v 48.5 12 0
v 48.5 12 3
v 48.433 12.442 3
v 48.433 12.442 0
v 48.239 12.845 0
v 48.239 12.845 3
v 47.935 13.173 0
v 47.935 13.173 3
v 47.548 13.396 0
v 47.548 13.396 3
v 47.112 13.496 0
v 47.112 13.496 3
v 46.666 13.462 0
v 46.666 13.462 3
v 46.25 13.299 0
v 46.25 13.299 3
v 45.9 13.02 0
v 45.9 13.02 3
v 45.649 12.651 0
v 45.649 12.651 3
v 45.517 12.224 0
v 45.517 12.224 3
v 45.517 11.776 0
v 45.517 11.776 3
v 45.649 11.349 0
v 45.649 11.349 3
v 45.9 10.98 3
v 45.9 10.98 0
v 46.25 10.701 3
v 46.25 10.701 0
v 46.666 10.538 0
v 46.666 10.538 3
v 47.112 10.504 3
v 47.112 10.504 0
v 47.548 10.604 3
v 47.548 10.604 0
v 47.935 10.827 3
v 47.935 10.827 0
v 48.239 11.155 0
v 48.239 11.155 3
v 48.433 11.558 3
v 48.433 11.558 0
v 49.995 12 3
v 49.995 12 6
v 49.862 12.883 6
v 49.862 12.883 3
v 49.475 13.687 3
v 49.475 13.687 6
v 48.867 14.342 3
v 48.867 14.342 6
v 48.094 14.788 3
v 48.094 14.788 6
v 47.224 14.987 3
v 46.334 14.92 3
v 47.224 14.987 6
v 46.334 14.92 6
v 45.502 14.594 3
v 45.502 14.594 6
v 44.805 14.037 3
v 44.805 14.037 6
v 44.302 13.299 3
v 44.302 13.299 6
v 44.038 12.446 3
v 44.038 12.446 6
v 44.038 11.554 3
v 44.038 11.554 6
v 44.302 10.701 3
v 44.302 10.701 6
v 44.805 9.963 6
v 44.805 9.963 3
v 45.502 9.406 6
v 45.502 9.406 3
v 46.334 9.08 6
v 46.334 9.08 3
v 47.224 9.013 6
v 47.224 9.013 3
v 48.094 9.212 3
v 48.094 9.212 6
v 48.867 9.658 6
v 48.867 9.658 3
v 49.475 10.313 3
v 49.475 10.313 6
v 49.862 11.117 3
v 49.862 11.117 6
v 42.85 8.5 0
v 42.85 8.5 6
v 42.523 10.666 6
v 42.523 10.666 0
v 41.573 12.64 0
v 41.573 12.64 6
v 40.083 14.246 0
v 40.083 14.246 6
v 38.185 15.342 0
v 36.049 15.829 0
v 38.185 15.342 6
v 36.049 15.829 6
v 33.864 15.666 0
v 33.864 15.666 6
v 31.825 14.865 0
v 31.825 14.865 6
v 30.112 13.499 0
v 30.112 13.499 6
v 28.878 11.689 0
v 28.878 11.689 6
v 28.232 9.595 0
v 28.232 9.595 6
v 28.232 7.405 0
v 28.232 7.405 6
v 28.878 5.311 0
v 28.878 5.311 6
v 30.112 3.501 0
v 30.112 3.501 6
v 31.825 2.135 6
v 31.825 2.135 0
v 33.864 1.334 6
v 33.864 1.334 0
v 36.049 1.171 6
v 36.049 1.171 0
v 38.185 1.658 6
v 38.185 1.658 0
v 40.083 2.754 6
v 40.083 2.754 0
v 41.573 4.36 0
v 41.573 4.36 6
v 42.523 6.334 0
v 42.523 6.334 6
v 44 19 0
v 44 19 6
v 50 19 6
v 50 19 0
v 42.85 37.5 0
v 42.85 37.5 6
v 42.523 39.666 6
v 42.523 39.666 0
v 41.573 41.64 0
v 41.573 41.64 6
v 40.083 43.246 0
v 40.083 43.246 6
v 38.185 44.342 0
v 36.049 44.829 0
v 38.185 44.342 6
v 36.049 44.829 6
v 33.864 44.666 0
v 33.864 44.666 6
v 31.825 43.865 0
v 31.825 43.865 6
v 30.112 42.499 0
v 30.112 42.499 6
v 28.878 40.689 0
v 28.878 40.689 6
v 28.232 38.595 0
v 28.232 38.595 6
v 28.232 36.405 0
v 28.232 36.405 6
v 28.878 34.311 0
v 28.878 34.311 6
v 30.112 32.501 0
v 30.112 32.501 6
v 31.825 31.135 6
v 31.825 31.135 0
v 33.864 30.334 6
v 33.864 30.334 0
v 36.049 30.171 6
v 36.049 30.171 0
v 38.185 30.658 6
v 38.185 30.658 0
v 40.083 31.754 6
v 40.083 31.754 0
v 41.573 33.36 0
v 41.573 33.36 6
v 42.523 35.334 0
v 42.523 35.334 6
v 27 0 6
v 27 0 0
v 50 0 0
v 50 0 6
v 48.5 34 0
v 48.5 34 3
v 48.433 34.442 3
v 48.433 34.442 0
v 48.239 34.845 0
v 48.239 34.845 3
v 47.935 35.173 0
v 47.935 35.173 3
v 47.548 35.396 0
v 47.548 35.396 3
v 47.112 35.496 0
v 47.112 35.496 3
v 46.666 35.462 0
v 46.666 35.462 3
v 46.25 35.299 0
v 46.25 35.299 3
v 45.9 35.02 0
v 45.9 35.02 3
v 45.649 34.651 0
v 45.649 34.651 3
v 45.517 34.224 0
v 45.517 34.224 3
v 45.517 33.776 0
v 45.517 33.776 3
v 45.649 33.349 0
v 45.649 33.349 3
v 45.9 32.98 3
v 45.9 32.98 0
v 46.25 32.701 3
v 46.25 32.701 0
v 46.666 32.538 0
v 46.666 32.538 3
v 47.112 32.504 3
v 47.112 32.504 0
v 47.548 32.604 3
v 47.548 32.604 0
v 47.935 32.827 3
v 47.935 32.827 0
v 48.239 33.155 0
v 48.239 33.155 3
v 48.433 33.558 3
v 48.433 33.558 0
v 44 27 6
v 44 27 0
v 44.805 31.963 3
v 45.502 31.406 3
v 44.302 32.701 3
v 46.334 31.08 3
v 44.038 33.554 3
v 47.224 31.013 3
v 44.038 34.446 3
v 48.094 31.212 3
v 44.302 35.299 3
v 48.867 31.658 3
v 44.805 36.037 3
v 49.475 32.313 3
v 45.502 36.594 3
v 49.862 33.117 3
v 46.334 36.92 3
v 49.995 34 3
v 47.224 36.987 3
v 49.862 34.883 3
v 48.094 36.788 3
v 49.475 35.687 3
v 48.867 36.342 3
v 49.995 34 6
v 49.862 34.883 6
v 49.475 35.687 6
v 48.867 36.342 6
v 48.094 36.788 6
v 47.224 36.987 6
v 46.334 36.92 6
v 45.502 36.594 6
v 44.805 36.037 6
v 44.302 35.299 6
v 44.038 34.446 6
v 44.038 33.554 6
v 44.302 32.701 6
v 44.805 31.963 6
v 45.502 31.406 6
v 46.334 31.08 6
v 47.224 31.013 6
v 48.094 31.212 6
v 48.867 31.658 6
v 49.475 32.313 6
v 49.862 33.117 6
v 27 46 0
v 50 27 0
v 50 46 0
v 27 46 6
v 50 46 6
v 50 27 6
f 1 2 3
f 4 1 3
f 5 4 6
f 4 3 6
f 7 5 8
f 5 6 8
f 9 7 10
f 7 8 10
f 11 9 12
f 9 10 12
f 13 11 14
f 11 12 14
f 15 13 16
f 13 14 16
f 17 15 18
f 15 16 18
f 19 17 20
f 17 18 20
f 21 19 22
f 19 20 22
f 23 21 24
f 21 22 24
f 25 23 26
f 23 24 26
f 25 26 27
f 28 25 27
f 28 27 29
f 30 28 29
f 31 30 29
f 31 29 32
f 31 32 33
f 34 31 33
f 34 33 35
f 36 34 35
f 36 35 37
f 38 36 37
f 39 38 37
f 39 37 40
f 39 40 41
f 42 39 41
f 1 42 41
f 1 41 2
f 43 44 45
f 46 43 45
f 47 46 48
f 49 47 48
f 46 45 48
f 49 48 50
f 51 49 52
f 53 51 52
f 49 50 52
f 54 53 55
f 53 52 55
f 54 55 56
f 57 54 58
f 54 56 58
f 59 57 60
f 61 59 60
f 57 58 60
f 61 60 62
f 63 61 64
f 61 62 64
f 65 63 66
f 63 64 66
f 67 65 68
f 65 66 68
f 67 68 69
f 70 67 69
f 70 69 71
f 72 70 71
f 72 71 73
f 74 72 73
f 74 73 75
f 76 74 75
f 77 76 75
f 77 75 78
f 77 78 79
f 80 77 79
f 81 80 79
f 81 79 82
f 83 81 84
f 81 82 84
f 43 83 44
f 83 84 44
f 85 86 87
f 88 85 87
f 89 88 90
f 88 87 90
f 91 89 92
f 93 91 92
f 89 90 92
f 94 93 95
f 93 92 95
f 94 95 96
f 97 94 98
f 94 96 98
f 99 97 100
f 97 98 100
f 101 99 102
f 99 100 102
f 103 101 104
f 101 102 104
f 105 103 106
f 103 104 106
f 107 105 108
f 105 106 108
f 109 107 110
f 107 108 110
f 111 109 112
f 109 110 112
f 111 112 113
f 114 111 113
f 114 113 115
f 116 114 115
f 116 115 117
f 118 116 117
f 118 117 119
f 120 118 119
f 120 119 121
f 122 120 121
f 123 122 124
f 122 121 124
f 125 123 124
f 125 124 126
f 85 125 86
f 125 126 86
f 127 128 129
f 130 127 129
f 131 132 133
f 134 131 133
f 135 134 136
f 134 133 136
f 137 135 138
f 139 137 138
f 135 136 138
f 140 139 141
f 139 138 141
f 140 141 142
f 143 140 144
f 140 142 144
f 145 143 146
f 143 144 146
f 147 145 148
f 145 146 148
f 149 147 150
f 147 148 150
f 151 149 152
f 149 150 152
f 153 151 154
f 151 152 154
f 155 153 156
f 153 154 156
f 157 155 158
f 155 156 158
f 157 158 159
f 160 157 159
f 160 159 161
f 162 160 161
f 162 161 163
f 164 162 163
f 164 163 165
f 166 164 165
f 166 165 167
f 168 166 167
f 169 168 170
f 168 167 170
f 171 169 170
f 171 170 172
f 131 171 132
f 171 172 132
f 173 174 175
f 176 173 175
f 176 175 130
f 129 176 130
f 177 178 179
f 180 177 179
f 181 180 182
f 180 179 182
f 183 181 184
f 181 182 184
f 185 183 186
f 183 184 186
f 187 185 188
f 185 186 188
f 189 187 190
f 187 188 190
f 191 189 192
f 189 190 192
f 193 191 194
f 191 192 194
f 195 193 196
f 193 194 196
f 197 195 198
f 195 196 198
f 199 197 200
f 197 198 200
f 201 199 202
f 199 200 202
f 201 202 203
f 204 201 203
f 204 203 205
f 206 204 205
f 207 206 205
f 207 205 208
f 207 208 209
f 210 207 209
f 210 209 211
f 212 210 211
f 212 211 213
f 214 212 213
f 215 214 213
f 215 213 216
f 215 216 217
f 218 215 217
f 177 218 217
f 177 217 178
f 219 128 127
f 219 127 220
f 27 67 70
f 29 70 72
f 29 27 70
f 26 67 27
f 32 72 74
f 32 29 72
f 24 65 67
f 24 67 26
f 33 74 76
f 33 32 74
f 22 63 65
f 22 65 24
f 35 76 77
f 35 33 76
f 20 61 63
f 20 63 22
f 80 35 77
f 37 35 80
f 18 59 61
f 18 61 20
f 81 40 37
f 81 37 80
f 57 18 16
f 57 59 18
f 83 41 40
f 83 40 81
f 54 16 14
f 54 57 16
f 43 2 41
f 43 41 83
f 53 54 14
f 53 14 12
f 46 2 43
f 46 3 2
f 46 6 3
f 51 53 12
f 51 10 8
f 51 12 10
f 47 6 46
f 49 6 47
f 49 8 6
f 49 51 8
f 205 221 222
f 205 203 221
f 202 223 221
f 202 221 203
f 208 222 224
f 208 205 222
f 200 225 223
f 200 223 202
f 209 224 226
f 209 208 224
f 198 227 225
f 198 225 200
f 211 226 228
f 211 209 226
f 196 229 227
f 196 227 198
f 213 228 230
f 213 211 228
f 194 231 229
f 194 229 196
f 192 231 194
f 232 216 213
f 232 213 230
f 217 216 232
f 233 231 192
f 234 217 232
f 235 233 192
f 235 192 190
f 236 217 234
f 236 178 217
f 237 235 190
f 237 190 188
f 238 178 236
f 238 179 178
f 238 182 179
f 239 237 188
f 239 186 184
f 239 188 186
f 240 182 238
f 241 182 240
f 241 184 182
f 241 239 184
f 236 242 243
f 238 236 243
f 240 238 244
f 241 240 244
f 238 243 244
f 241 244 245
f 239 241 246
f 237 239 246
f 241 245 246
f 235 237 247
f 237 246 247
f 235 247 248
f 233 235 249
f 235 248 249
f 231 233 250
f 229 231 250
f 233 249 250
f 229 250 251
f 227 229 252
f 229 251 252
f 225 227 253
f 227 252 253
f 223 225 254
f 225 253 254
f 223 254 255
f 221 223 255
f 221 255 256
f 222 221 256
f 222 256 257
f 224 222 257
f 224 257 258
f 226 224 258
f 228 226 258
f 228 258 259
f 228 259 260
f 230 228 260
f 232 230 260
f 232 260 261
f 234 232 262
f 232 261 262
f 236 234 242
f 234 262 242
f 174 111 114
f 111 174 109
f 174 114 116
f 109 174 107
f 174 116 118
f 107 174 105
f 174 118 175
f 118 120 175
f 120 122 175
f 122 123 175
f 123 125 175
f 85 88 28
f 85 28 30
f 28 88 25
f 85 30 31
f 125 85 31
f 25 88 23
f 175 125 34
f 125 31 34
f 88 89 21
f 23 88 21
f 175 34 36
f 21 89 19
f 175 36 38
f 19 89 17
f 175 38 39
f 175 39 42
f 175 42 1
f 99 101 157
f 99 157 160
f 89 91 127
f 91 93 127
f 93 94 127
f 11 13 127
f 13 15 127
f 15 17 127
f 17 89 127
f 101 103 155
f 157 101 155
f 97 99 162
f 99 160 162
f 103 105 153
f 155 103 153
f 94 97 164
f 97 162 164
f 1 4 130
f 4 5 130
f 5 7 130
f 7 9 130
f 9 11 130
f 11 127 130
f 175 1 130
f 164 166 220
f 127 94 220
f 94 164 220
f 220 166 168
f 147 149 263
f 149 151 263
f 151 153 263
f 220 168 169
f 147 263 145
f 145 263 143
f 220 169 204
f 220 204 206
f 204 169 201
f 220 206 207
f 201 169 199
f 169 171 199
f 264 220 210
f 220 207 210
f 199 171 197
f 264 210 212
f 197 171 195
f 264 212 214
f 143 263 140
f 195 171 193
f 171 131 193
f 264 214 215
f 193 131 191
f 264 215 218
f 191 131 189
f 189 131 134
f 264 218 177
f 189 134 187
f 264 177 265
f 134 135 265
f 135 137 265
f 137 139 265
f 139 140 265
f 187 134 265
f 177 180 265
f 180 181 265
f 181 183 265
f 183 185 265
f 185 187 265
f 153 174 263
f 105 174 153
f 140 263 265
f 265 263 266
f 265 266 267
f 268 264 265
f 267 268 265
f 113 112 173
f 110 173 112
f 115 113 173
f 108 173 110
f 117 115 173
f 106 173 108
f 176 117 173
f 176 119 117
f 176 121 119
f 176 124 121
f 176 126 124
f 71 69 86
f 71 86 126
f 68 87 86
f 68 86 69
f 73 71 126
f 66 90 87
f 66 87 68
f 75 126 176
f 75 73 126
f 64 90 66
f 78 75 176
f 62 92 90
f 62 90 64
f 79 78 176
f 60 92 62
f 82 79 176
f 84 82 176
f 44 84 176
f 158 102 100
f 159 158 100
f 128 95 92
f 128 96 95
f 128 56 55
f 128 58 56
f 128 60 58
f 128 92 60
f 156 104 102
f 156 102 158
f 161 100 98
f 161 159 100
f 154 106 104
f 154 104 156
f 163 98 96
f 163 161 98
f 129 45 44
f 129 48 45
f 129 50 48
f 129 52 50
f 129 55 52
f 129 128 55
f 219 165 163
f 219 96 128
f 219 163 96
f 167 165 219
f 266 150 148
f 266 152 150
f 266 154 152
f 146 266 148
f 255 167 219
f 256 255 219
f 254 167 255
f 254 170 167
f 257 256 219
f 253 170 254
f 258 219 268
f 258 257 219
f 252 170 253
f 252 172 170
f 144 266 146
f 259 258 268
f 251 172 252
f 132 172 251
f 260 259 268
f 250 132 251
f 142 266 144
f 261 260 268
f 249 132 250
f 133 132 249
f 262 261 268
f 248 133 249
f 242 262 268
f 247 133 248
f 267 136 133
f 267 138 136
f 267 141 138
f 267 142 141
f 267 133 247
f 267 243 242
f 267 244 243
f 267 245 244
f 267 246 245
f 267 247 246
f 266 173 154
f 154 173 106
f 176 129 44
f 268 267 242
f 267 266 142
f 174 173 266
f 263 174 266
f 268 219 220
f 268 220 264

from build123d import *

# Parameters (mm, degrees)
ESQUISSE1_W             = 50
ESQUISSE1_H             = 46
BOSS_EXTRU_2_DEPTH      = 6
ESQUISSE2_W             = 27
ESQUISSE2_H             = 46
ENL_V_MAT_EXTRU_1_DEPTH = 6
ESQUISSE3_R             = 7.35
ENL_V_MAT_EXTRU_2_DEPTH = 6
ESQUISSE4_R             = 1.5
ENL_V_MAT_EXTRU_3_DEPTH = 6
ESQUISSE5_R             = 2.995
ENL_V_MAT_EXTRU_5_DEPTH = 3
ESQUISSE6_W             = 6
ESQUISSE6_H             = 8
ENL_V_MAT_EXTRU_6_DEPTH = 6


with BuildPart() as part:
    # Esquisse1 → Boss.-Extru.2 (new body)
    with BuildSketch(Plane.XY):
        with Locations((25, 23)):
            Rectangle(ESQUISSE1_W, ESQUISSE1_H)
    extrude(amount=BOSS_EXTRU_2_DEPTH)

    # Esquisse2 → Enlèv. mat.-Extru.1 (cut)
    with BuildSketch(Plane.XY.offset(6)):
        with Locations((13.5, 23)):
            Rectangle(ESQUISSE2_W, ESQUISSE2_H)
    extrude(amount=-ENL_V_MAT_EXTRU_1_DEPTH, mode=Mode.SUBTRACT)

    # Esquisse3 → Enlèv. mat.-Extru.2 (cut)
    with BuildSketch(Plane.XY.offset(6)):
        with Locations((35.5, 37.5)):
            Circle(ESQUISSE3_R)
        with Locations((35.5, 8.5)):
            Circle(ESQUISSE3_R)
    extrude(amount=-ENL_V_MAT_EXTRU_2_DEPTH, mode=Mode.SUBTRACT)

    # Esquisse4 → Enlèv. mat.-Extru.3 (cut)
    with BuildSketch(Plane.XY.offset(6)):
        with Locations((47, 34)):
            Circle(ESQUISSE4_R)
        with Locations((47, 12)):
            Circle(ESQUISSE4_R)
    extrude(amount=-ENL_V_MAT_EXTRU_3_DEPTH, mode=Mode.SUBTRACT)

    # Esquisse5 → Enlèv. mat.-Extru.5 (cut)
    with BuildSketch(Plane.XY.offset(6)):
        with Locations((47, 12)):
            Circle(ESQUISSE5_R)
        with Locations((47, 34)):
            Circle(ESQUISSE5_R)
    extrude(amount=-ENL_V_MAT_EXTRU_5_DEPTH, mode=Mode.SUBTRACT)

    # Esquisse6 → Enlèv. mat.-Extru.6 (cut)
    with BuildSketch(Plane.XY.offset(6)):
        with Locations((47, 23)):
            Rectangle(ESQUISSE6_W, ESQUISSE6_H)
    extrude(amount=-ENL_V_MAT_EXTRU_6_DEPTH, mode=Mode.SUBTRACT)


solid = part.part
